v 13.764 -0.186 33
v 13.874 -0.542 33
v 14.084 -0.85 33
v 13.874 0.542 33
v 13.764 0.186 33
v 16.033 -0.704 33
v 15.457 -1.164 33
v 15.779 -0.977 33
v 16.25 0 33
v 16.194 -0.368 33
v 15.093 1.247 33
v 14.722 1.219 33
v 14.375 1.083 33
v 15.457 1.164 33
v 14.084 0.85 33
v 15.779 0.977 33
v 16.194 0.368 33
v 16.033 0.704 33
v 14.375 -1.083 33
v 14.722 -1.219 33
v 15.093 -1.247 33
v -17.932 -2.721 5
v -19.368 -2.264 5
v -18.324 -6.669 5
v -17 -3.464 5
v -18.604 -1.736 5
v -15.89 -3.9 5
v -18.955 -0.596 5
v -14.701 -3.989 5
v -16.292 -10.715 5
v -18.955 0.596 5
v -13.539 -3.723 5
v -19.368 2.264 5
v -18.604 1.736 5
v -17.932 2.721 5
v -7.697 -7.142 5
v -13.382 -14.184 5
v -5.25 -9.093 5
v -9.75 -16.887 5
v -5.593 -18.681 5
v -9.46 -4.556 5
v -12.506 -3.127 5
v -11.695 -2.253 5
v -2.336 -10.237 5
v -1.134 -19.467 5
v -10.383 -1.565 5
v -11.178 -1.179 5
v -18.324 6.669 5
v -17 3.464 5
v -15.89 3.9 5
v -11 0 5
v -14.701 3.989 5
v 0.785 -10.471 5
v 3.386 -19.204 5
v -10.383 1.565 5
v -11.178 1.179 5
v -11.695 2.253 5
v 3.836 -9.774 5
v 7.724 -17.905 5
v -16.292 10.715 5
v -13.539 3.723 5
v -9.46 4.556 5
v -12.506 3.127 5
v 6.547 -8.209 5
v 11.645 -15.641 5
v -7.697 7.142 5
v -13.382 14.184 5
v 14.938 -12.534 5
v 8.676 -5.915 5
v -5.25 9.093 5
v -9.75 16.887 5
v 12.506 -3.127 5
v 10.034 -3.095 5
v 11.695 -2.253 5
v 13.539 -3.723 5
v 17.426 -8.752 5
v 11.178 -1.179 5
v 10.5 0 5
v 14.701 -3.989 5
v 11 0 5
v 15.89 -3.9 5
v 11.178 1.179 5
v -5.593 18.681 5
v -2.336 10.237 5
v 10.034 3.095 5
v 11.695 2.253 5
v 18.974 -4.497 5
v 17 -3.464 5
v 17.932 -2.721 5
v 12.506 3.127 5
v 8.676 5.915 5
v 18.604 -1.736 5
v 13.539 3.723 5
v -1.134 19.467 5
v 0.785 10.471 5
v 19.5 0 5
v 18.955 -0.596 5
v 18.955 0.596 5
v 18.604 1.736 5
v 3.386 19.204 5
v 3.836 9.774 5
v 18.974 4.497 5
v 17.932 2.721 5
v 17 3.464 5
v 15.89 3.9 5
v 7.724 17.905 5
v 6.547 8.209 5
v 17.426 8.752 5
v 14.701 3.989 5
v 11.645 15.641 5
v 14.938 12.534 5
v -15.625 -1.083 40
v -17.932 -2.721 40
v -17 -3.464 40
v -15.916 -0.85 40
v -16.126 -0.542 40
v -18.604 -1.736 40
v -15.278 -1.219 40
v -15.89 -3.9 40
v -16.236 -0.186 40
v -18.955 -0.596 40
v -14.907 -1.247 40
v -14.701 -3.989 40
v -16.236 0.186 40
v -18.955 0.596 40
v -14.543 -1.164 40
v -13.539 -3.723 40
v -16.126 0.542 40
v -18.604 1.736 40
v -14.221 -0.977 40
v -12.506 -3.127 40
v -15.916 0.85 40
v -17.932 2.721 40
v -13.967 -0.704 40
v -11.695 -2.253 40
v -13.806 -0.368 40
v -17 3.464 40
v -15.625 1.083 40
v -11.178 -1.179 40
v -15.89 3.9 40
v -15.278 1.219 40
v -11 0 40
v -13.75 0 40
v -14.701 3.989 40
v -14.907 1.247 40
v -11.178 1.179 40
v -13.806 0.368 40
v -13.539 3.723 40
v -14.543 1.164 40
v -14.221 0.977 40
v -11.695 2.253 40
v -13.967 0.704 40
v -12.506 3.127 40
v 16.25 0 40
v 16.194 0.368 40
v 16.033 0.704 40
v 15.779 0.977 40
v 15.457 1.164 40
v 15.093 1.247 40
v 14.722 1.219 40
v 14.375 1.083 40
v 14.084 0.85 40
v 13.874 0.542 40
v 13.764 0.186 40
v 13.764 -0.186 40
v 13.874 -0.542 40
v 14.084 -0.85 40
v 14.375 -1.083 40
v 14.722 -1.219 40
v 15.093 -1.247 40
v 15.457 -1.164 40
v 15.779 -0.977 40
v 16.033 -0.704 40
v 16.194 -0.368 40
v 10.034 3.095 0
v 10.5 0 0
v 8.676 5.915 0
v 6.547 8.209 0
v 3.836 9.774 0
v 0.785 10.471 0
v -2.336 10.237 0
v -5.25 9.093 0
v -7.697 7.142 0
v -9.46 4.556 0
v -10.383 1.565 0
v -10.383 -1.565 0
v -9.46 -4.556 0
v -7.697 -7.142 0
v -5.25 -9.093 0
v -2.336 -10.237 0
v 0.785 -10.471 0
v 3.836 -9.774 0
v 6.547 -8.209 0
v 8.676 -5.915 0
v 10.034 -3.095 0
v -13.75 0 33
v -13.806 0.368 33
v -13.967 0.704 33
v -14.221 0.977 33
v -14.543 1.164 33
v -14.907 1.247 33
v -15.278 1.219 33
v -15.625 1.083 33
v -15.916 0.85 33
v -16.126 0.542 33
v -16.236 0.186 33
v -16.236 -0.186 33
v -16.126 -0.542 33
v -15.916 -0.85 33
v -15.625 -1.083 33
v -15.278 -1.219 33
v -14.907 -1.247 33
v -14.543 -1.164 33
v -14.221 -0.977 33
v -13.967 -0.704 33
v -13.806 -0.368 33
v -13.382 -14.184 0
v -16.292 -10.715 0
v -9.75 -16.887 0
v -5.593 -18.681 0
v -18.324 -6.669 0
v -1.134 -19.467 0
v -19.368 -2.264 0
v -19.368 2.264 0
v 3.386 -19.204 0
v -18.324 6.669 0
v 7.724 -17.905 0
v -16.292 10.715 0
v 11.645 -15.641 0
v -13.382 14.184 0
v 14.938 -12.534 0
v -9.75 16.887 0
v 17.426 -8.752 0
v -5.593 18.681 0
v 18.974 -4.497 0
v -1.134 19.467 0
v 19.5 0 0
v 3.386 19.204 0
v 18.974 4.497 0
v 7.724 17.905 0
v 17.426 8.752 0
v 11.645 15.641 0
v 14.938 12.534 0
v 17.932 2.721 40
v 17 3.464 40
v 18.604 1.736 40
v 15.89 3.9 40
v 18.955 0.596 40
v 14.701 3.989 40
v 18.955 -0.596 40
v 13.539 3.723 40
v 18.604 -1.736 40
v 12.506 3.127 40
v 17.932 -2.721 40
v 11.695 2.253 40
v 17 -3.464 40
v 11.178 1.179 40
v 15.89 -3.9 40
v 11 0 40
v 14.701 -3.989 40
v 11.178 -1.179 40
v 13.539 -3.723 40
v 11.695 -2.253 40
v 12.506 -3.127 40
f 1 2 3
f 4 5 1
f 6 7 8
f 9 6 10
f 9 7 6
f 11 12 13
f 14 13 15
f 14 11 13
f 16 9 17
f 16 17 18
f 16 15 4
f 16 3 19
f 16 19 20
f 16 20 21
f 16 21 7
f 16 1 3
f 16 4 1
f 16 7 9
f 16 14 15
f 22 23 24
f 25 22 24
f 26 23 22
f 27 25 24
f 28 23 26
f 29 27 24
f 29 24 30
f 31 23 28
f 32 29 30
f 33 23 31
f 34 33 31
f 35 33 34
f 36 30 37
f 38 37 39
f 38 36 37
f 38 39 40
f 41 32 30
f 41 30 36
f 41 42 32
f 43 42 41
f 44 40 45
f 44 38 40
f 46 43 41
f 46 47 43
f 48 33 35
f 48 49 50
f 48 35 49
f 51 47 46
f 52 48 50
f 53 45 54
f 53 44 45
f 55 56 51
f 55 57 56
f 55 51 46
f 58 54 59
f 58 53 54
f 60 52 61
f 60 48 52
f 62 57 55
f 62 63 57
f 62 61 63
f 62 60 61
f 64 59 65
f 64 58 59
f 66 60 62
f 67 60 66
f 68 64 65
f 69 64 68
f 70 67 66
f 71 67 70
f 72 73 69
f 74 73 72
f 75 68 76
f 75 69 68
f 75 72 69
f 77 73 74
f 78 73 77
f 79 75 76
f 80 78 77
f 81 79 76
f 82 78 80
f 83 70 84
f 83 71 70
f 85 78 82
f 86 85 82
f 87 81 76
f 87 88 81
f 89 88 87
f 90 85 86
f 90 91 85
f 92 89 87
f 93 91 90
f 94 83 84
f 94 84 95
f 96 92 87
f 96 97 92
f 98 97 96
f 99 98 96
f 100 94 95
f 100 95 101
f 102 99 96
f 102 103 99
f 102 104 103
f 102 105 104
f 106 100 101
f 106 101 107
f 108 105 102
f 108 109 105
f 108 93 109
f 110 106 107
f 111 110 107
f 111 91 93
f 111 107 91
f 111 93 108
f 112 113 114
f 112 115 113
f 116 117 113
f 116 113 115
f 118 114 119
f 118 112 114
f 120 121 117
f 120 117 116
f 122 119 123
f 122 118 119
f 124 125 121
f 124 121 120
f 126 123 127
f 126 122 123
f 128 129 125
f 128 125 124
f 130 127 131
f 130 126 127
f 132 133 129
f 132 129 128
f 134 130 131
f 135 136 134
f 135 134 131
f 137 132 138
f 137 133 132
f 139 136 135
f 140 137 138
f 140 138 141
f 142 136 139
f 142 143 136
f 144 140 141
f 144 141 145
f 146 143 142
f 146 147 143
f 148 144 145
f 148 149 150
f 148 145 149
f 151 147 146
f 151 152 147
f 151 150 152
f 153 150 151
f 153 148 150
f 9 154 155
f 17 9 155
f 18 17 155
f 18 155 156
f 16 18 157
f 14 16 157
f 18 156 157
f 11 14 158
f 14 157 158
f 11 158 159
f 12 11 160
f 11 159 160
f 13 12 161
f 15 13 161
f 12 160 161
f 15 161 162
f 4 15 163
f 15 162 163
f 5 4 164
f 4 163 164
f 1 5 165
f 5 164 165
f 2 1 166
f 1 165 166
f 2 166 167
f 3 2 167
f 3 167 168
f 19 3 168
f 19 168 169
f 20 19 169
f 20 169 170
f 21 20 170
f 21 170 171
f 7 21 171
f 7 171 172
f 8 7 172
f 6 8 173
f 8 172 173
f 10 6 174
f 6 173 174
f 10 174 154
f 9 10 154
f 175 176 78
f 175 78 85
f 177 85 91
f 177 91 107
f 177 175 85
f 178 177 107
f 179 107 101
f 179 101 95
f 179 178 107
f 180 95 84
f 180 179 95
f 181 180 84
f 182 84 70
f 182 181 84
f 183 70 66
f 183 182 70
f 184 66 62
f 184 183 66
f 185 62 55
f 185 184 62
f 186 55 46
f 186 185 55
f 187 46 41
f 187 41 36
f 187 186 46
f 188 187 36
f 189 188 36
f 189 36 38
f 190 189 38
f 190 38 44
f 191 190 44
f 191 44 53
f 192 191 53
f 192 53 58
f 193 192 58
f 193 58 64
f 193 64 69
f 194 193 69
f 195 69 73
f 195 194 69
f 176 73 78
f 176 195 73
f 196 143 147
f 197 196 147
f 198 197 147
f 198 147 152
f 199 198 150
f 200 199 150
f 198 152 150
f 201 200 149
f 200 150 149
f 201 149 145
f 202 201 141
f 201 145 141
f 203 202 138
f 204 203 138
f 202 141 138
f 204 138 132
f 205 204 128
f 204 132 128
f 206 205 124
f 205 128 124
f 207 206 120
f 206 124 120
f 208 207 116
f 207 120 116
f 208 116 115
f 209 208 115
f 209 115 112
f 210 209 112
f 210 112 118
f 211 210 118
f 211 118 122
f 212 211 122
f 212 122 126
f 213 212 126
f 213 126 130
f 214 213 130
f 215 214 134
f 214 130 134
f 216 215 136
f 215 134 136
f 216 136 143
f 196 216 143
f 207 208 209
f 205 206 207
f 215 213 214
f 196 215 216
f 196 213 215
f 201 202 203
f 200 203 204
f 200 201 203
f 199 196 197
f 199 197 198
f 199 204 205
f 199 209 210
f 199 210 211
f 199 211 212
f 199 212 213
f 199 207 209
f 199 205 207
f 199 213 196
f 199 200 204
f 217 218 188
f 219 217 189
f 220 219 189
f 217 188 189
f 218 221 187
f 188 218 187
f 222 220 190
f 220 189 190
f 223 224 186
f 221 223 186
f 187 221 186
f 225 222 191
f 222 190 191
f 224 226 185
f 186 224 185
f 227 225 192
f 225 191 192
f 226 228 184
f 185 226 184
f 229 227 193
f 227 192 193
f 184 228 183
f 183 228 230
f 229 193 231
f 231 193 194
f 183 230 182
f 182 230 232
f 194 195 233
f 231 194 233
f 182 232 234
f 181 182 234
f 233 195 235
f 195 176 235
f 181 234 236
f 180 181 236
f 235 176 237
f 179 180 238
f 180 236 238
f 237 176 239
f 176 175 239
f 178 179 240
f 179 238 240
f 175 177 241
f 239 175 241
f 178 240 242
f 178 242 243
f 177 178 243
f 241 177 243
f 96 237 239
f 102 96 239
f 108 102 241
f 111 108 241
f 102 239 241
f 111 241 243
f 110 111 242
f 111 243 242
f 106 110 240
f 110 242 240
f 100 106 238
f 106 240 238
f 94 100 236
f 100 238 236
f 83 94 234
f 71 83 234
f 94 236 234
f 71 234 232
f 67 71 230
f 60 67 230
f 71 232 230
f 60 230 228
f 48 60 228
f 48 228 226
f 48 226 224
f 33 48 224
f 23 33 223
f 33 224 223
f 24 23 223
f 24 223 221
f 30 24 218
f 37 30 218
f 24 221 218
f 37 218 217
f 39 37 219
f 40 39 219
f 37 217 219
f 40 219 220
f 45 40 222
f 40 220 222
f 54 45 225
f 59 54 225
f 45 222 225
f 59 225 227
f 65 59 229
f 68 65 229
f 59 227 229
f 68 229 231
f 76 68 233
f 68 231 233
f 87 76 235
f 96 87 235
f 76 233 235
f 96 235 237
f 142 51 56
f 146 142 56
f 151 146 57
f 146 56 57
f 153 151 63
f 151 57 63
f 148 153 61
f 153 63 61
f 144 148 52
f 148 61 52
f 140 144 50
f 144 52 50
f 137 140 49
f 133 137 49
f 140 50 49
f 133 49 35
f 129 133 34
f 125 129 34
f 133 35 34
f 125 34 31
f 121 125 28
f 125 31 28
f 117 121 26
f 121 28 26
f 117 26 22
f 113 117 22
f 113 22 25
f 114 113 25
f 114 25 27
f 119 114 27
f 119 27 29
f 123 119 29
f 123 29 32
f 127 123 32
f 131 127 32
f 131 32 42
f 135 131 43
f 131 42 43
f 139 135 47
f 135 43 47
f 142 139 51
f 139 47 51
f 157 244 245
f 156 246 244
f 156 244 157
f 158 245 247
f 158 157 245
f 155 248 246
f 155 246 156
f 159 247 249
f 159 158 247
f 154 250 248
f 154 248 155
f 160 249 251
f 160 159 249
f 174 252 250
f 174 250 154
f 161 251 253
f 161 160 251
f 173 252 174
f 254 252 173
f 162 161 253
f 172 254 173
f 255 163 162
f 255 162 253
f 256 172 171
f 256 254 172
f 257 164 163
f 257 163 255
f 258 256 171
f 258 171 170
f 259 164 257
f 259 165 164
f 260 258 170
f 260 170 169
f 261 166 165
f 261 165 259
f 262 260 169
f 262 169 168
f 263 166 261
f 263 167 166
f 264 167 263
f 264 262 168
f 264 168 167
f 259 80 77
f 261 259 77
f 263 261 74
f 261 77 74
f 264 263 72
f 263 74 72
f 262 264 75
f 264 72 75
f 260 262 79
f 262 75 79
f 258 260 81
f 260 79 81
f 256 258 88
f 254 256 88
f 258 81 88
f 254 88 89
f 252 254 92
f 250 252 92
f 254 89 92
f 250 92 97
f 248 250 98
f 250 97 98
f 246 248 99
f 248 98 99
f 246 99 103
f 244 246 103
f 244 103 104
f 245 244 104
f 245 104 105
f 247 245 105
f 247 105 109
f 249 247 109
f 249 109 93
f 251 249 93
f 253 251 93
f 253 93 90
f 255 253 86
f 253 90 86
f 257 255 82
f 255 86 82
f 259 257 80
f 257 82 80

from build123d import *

# Parameters (mm, degrees)
SKETCH1_R           = 19.5
SKETCH1_R_2         = 10.5
BOSS_EXTRUDE1_DEPTH = 5
SKETCH3_R           = 4
BOSS_EXTRUDE2_DEPTH = 35
SKETCH4_R           = 1.25
CUT_EXTRUDE1_DEPTH  = 7


with BuildPart() as part:
    # Sketch1 → Boss-Extrude1 (new body)
    with BuildSketch(Plane.XY):
        Circle(SKETCH1_R)
        Circle(SKETCH1_R_2, mode=Mode.SUBTRACT)
    extrude(amount=BOSS_EXTRUDE1_DEPTH)

    # Sketch3 → Boss-Extrude2 (add)
    with BuildSketch(Plane.XY.offset(5)):
        with Locations((-15, 0)):
            Circle(SKETCH3_R)
        with Locations(Location((15, 0, 0), (0, 0, 180))):
            Circle(SKETCH3_R)
    extrude(amount=BOSS_EXTRUDE2_DEPTH)

    # Sketch4 → Cut-Extrude1 (cut)
    with BuildSketch(Plane.XY.offset(40)):
        with Locations((15, 0)):
            Circle(SKETCH4_R)
        with Locations((-15, 0)):
            Circle(SKETCH4_R)
    extrude(amount=-CUT_EXTRUDE1_DEPTH, mode=Mode.SUBTRACT)


solid = part.part
